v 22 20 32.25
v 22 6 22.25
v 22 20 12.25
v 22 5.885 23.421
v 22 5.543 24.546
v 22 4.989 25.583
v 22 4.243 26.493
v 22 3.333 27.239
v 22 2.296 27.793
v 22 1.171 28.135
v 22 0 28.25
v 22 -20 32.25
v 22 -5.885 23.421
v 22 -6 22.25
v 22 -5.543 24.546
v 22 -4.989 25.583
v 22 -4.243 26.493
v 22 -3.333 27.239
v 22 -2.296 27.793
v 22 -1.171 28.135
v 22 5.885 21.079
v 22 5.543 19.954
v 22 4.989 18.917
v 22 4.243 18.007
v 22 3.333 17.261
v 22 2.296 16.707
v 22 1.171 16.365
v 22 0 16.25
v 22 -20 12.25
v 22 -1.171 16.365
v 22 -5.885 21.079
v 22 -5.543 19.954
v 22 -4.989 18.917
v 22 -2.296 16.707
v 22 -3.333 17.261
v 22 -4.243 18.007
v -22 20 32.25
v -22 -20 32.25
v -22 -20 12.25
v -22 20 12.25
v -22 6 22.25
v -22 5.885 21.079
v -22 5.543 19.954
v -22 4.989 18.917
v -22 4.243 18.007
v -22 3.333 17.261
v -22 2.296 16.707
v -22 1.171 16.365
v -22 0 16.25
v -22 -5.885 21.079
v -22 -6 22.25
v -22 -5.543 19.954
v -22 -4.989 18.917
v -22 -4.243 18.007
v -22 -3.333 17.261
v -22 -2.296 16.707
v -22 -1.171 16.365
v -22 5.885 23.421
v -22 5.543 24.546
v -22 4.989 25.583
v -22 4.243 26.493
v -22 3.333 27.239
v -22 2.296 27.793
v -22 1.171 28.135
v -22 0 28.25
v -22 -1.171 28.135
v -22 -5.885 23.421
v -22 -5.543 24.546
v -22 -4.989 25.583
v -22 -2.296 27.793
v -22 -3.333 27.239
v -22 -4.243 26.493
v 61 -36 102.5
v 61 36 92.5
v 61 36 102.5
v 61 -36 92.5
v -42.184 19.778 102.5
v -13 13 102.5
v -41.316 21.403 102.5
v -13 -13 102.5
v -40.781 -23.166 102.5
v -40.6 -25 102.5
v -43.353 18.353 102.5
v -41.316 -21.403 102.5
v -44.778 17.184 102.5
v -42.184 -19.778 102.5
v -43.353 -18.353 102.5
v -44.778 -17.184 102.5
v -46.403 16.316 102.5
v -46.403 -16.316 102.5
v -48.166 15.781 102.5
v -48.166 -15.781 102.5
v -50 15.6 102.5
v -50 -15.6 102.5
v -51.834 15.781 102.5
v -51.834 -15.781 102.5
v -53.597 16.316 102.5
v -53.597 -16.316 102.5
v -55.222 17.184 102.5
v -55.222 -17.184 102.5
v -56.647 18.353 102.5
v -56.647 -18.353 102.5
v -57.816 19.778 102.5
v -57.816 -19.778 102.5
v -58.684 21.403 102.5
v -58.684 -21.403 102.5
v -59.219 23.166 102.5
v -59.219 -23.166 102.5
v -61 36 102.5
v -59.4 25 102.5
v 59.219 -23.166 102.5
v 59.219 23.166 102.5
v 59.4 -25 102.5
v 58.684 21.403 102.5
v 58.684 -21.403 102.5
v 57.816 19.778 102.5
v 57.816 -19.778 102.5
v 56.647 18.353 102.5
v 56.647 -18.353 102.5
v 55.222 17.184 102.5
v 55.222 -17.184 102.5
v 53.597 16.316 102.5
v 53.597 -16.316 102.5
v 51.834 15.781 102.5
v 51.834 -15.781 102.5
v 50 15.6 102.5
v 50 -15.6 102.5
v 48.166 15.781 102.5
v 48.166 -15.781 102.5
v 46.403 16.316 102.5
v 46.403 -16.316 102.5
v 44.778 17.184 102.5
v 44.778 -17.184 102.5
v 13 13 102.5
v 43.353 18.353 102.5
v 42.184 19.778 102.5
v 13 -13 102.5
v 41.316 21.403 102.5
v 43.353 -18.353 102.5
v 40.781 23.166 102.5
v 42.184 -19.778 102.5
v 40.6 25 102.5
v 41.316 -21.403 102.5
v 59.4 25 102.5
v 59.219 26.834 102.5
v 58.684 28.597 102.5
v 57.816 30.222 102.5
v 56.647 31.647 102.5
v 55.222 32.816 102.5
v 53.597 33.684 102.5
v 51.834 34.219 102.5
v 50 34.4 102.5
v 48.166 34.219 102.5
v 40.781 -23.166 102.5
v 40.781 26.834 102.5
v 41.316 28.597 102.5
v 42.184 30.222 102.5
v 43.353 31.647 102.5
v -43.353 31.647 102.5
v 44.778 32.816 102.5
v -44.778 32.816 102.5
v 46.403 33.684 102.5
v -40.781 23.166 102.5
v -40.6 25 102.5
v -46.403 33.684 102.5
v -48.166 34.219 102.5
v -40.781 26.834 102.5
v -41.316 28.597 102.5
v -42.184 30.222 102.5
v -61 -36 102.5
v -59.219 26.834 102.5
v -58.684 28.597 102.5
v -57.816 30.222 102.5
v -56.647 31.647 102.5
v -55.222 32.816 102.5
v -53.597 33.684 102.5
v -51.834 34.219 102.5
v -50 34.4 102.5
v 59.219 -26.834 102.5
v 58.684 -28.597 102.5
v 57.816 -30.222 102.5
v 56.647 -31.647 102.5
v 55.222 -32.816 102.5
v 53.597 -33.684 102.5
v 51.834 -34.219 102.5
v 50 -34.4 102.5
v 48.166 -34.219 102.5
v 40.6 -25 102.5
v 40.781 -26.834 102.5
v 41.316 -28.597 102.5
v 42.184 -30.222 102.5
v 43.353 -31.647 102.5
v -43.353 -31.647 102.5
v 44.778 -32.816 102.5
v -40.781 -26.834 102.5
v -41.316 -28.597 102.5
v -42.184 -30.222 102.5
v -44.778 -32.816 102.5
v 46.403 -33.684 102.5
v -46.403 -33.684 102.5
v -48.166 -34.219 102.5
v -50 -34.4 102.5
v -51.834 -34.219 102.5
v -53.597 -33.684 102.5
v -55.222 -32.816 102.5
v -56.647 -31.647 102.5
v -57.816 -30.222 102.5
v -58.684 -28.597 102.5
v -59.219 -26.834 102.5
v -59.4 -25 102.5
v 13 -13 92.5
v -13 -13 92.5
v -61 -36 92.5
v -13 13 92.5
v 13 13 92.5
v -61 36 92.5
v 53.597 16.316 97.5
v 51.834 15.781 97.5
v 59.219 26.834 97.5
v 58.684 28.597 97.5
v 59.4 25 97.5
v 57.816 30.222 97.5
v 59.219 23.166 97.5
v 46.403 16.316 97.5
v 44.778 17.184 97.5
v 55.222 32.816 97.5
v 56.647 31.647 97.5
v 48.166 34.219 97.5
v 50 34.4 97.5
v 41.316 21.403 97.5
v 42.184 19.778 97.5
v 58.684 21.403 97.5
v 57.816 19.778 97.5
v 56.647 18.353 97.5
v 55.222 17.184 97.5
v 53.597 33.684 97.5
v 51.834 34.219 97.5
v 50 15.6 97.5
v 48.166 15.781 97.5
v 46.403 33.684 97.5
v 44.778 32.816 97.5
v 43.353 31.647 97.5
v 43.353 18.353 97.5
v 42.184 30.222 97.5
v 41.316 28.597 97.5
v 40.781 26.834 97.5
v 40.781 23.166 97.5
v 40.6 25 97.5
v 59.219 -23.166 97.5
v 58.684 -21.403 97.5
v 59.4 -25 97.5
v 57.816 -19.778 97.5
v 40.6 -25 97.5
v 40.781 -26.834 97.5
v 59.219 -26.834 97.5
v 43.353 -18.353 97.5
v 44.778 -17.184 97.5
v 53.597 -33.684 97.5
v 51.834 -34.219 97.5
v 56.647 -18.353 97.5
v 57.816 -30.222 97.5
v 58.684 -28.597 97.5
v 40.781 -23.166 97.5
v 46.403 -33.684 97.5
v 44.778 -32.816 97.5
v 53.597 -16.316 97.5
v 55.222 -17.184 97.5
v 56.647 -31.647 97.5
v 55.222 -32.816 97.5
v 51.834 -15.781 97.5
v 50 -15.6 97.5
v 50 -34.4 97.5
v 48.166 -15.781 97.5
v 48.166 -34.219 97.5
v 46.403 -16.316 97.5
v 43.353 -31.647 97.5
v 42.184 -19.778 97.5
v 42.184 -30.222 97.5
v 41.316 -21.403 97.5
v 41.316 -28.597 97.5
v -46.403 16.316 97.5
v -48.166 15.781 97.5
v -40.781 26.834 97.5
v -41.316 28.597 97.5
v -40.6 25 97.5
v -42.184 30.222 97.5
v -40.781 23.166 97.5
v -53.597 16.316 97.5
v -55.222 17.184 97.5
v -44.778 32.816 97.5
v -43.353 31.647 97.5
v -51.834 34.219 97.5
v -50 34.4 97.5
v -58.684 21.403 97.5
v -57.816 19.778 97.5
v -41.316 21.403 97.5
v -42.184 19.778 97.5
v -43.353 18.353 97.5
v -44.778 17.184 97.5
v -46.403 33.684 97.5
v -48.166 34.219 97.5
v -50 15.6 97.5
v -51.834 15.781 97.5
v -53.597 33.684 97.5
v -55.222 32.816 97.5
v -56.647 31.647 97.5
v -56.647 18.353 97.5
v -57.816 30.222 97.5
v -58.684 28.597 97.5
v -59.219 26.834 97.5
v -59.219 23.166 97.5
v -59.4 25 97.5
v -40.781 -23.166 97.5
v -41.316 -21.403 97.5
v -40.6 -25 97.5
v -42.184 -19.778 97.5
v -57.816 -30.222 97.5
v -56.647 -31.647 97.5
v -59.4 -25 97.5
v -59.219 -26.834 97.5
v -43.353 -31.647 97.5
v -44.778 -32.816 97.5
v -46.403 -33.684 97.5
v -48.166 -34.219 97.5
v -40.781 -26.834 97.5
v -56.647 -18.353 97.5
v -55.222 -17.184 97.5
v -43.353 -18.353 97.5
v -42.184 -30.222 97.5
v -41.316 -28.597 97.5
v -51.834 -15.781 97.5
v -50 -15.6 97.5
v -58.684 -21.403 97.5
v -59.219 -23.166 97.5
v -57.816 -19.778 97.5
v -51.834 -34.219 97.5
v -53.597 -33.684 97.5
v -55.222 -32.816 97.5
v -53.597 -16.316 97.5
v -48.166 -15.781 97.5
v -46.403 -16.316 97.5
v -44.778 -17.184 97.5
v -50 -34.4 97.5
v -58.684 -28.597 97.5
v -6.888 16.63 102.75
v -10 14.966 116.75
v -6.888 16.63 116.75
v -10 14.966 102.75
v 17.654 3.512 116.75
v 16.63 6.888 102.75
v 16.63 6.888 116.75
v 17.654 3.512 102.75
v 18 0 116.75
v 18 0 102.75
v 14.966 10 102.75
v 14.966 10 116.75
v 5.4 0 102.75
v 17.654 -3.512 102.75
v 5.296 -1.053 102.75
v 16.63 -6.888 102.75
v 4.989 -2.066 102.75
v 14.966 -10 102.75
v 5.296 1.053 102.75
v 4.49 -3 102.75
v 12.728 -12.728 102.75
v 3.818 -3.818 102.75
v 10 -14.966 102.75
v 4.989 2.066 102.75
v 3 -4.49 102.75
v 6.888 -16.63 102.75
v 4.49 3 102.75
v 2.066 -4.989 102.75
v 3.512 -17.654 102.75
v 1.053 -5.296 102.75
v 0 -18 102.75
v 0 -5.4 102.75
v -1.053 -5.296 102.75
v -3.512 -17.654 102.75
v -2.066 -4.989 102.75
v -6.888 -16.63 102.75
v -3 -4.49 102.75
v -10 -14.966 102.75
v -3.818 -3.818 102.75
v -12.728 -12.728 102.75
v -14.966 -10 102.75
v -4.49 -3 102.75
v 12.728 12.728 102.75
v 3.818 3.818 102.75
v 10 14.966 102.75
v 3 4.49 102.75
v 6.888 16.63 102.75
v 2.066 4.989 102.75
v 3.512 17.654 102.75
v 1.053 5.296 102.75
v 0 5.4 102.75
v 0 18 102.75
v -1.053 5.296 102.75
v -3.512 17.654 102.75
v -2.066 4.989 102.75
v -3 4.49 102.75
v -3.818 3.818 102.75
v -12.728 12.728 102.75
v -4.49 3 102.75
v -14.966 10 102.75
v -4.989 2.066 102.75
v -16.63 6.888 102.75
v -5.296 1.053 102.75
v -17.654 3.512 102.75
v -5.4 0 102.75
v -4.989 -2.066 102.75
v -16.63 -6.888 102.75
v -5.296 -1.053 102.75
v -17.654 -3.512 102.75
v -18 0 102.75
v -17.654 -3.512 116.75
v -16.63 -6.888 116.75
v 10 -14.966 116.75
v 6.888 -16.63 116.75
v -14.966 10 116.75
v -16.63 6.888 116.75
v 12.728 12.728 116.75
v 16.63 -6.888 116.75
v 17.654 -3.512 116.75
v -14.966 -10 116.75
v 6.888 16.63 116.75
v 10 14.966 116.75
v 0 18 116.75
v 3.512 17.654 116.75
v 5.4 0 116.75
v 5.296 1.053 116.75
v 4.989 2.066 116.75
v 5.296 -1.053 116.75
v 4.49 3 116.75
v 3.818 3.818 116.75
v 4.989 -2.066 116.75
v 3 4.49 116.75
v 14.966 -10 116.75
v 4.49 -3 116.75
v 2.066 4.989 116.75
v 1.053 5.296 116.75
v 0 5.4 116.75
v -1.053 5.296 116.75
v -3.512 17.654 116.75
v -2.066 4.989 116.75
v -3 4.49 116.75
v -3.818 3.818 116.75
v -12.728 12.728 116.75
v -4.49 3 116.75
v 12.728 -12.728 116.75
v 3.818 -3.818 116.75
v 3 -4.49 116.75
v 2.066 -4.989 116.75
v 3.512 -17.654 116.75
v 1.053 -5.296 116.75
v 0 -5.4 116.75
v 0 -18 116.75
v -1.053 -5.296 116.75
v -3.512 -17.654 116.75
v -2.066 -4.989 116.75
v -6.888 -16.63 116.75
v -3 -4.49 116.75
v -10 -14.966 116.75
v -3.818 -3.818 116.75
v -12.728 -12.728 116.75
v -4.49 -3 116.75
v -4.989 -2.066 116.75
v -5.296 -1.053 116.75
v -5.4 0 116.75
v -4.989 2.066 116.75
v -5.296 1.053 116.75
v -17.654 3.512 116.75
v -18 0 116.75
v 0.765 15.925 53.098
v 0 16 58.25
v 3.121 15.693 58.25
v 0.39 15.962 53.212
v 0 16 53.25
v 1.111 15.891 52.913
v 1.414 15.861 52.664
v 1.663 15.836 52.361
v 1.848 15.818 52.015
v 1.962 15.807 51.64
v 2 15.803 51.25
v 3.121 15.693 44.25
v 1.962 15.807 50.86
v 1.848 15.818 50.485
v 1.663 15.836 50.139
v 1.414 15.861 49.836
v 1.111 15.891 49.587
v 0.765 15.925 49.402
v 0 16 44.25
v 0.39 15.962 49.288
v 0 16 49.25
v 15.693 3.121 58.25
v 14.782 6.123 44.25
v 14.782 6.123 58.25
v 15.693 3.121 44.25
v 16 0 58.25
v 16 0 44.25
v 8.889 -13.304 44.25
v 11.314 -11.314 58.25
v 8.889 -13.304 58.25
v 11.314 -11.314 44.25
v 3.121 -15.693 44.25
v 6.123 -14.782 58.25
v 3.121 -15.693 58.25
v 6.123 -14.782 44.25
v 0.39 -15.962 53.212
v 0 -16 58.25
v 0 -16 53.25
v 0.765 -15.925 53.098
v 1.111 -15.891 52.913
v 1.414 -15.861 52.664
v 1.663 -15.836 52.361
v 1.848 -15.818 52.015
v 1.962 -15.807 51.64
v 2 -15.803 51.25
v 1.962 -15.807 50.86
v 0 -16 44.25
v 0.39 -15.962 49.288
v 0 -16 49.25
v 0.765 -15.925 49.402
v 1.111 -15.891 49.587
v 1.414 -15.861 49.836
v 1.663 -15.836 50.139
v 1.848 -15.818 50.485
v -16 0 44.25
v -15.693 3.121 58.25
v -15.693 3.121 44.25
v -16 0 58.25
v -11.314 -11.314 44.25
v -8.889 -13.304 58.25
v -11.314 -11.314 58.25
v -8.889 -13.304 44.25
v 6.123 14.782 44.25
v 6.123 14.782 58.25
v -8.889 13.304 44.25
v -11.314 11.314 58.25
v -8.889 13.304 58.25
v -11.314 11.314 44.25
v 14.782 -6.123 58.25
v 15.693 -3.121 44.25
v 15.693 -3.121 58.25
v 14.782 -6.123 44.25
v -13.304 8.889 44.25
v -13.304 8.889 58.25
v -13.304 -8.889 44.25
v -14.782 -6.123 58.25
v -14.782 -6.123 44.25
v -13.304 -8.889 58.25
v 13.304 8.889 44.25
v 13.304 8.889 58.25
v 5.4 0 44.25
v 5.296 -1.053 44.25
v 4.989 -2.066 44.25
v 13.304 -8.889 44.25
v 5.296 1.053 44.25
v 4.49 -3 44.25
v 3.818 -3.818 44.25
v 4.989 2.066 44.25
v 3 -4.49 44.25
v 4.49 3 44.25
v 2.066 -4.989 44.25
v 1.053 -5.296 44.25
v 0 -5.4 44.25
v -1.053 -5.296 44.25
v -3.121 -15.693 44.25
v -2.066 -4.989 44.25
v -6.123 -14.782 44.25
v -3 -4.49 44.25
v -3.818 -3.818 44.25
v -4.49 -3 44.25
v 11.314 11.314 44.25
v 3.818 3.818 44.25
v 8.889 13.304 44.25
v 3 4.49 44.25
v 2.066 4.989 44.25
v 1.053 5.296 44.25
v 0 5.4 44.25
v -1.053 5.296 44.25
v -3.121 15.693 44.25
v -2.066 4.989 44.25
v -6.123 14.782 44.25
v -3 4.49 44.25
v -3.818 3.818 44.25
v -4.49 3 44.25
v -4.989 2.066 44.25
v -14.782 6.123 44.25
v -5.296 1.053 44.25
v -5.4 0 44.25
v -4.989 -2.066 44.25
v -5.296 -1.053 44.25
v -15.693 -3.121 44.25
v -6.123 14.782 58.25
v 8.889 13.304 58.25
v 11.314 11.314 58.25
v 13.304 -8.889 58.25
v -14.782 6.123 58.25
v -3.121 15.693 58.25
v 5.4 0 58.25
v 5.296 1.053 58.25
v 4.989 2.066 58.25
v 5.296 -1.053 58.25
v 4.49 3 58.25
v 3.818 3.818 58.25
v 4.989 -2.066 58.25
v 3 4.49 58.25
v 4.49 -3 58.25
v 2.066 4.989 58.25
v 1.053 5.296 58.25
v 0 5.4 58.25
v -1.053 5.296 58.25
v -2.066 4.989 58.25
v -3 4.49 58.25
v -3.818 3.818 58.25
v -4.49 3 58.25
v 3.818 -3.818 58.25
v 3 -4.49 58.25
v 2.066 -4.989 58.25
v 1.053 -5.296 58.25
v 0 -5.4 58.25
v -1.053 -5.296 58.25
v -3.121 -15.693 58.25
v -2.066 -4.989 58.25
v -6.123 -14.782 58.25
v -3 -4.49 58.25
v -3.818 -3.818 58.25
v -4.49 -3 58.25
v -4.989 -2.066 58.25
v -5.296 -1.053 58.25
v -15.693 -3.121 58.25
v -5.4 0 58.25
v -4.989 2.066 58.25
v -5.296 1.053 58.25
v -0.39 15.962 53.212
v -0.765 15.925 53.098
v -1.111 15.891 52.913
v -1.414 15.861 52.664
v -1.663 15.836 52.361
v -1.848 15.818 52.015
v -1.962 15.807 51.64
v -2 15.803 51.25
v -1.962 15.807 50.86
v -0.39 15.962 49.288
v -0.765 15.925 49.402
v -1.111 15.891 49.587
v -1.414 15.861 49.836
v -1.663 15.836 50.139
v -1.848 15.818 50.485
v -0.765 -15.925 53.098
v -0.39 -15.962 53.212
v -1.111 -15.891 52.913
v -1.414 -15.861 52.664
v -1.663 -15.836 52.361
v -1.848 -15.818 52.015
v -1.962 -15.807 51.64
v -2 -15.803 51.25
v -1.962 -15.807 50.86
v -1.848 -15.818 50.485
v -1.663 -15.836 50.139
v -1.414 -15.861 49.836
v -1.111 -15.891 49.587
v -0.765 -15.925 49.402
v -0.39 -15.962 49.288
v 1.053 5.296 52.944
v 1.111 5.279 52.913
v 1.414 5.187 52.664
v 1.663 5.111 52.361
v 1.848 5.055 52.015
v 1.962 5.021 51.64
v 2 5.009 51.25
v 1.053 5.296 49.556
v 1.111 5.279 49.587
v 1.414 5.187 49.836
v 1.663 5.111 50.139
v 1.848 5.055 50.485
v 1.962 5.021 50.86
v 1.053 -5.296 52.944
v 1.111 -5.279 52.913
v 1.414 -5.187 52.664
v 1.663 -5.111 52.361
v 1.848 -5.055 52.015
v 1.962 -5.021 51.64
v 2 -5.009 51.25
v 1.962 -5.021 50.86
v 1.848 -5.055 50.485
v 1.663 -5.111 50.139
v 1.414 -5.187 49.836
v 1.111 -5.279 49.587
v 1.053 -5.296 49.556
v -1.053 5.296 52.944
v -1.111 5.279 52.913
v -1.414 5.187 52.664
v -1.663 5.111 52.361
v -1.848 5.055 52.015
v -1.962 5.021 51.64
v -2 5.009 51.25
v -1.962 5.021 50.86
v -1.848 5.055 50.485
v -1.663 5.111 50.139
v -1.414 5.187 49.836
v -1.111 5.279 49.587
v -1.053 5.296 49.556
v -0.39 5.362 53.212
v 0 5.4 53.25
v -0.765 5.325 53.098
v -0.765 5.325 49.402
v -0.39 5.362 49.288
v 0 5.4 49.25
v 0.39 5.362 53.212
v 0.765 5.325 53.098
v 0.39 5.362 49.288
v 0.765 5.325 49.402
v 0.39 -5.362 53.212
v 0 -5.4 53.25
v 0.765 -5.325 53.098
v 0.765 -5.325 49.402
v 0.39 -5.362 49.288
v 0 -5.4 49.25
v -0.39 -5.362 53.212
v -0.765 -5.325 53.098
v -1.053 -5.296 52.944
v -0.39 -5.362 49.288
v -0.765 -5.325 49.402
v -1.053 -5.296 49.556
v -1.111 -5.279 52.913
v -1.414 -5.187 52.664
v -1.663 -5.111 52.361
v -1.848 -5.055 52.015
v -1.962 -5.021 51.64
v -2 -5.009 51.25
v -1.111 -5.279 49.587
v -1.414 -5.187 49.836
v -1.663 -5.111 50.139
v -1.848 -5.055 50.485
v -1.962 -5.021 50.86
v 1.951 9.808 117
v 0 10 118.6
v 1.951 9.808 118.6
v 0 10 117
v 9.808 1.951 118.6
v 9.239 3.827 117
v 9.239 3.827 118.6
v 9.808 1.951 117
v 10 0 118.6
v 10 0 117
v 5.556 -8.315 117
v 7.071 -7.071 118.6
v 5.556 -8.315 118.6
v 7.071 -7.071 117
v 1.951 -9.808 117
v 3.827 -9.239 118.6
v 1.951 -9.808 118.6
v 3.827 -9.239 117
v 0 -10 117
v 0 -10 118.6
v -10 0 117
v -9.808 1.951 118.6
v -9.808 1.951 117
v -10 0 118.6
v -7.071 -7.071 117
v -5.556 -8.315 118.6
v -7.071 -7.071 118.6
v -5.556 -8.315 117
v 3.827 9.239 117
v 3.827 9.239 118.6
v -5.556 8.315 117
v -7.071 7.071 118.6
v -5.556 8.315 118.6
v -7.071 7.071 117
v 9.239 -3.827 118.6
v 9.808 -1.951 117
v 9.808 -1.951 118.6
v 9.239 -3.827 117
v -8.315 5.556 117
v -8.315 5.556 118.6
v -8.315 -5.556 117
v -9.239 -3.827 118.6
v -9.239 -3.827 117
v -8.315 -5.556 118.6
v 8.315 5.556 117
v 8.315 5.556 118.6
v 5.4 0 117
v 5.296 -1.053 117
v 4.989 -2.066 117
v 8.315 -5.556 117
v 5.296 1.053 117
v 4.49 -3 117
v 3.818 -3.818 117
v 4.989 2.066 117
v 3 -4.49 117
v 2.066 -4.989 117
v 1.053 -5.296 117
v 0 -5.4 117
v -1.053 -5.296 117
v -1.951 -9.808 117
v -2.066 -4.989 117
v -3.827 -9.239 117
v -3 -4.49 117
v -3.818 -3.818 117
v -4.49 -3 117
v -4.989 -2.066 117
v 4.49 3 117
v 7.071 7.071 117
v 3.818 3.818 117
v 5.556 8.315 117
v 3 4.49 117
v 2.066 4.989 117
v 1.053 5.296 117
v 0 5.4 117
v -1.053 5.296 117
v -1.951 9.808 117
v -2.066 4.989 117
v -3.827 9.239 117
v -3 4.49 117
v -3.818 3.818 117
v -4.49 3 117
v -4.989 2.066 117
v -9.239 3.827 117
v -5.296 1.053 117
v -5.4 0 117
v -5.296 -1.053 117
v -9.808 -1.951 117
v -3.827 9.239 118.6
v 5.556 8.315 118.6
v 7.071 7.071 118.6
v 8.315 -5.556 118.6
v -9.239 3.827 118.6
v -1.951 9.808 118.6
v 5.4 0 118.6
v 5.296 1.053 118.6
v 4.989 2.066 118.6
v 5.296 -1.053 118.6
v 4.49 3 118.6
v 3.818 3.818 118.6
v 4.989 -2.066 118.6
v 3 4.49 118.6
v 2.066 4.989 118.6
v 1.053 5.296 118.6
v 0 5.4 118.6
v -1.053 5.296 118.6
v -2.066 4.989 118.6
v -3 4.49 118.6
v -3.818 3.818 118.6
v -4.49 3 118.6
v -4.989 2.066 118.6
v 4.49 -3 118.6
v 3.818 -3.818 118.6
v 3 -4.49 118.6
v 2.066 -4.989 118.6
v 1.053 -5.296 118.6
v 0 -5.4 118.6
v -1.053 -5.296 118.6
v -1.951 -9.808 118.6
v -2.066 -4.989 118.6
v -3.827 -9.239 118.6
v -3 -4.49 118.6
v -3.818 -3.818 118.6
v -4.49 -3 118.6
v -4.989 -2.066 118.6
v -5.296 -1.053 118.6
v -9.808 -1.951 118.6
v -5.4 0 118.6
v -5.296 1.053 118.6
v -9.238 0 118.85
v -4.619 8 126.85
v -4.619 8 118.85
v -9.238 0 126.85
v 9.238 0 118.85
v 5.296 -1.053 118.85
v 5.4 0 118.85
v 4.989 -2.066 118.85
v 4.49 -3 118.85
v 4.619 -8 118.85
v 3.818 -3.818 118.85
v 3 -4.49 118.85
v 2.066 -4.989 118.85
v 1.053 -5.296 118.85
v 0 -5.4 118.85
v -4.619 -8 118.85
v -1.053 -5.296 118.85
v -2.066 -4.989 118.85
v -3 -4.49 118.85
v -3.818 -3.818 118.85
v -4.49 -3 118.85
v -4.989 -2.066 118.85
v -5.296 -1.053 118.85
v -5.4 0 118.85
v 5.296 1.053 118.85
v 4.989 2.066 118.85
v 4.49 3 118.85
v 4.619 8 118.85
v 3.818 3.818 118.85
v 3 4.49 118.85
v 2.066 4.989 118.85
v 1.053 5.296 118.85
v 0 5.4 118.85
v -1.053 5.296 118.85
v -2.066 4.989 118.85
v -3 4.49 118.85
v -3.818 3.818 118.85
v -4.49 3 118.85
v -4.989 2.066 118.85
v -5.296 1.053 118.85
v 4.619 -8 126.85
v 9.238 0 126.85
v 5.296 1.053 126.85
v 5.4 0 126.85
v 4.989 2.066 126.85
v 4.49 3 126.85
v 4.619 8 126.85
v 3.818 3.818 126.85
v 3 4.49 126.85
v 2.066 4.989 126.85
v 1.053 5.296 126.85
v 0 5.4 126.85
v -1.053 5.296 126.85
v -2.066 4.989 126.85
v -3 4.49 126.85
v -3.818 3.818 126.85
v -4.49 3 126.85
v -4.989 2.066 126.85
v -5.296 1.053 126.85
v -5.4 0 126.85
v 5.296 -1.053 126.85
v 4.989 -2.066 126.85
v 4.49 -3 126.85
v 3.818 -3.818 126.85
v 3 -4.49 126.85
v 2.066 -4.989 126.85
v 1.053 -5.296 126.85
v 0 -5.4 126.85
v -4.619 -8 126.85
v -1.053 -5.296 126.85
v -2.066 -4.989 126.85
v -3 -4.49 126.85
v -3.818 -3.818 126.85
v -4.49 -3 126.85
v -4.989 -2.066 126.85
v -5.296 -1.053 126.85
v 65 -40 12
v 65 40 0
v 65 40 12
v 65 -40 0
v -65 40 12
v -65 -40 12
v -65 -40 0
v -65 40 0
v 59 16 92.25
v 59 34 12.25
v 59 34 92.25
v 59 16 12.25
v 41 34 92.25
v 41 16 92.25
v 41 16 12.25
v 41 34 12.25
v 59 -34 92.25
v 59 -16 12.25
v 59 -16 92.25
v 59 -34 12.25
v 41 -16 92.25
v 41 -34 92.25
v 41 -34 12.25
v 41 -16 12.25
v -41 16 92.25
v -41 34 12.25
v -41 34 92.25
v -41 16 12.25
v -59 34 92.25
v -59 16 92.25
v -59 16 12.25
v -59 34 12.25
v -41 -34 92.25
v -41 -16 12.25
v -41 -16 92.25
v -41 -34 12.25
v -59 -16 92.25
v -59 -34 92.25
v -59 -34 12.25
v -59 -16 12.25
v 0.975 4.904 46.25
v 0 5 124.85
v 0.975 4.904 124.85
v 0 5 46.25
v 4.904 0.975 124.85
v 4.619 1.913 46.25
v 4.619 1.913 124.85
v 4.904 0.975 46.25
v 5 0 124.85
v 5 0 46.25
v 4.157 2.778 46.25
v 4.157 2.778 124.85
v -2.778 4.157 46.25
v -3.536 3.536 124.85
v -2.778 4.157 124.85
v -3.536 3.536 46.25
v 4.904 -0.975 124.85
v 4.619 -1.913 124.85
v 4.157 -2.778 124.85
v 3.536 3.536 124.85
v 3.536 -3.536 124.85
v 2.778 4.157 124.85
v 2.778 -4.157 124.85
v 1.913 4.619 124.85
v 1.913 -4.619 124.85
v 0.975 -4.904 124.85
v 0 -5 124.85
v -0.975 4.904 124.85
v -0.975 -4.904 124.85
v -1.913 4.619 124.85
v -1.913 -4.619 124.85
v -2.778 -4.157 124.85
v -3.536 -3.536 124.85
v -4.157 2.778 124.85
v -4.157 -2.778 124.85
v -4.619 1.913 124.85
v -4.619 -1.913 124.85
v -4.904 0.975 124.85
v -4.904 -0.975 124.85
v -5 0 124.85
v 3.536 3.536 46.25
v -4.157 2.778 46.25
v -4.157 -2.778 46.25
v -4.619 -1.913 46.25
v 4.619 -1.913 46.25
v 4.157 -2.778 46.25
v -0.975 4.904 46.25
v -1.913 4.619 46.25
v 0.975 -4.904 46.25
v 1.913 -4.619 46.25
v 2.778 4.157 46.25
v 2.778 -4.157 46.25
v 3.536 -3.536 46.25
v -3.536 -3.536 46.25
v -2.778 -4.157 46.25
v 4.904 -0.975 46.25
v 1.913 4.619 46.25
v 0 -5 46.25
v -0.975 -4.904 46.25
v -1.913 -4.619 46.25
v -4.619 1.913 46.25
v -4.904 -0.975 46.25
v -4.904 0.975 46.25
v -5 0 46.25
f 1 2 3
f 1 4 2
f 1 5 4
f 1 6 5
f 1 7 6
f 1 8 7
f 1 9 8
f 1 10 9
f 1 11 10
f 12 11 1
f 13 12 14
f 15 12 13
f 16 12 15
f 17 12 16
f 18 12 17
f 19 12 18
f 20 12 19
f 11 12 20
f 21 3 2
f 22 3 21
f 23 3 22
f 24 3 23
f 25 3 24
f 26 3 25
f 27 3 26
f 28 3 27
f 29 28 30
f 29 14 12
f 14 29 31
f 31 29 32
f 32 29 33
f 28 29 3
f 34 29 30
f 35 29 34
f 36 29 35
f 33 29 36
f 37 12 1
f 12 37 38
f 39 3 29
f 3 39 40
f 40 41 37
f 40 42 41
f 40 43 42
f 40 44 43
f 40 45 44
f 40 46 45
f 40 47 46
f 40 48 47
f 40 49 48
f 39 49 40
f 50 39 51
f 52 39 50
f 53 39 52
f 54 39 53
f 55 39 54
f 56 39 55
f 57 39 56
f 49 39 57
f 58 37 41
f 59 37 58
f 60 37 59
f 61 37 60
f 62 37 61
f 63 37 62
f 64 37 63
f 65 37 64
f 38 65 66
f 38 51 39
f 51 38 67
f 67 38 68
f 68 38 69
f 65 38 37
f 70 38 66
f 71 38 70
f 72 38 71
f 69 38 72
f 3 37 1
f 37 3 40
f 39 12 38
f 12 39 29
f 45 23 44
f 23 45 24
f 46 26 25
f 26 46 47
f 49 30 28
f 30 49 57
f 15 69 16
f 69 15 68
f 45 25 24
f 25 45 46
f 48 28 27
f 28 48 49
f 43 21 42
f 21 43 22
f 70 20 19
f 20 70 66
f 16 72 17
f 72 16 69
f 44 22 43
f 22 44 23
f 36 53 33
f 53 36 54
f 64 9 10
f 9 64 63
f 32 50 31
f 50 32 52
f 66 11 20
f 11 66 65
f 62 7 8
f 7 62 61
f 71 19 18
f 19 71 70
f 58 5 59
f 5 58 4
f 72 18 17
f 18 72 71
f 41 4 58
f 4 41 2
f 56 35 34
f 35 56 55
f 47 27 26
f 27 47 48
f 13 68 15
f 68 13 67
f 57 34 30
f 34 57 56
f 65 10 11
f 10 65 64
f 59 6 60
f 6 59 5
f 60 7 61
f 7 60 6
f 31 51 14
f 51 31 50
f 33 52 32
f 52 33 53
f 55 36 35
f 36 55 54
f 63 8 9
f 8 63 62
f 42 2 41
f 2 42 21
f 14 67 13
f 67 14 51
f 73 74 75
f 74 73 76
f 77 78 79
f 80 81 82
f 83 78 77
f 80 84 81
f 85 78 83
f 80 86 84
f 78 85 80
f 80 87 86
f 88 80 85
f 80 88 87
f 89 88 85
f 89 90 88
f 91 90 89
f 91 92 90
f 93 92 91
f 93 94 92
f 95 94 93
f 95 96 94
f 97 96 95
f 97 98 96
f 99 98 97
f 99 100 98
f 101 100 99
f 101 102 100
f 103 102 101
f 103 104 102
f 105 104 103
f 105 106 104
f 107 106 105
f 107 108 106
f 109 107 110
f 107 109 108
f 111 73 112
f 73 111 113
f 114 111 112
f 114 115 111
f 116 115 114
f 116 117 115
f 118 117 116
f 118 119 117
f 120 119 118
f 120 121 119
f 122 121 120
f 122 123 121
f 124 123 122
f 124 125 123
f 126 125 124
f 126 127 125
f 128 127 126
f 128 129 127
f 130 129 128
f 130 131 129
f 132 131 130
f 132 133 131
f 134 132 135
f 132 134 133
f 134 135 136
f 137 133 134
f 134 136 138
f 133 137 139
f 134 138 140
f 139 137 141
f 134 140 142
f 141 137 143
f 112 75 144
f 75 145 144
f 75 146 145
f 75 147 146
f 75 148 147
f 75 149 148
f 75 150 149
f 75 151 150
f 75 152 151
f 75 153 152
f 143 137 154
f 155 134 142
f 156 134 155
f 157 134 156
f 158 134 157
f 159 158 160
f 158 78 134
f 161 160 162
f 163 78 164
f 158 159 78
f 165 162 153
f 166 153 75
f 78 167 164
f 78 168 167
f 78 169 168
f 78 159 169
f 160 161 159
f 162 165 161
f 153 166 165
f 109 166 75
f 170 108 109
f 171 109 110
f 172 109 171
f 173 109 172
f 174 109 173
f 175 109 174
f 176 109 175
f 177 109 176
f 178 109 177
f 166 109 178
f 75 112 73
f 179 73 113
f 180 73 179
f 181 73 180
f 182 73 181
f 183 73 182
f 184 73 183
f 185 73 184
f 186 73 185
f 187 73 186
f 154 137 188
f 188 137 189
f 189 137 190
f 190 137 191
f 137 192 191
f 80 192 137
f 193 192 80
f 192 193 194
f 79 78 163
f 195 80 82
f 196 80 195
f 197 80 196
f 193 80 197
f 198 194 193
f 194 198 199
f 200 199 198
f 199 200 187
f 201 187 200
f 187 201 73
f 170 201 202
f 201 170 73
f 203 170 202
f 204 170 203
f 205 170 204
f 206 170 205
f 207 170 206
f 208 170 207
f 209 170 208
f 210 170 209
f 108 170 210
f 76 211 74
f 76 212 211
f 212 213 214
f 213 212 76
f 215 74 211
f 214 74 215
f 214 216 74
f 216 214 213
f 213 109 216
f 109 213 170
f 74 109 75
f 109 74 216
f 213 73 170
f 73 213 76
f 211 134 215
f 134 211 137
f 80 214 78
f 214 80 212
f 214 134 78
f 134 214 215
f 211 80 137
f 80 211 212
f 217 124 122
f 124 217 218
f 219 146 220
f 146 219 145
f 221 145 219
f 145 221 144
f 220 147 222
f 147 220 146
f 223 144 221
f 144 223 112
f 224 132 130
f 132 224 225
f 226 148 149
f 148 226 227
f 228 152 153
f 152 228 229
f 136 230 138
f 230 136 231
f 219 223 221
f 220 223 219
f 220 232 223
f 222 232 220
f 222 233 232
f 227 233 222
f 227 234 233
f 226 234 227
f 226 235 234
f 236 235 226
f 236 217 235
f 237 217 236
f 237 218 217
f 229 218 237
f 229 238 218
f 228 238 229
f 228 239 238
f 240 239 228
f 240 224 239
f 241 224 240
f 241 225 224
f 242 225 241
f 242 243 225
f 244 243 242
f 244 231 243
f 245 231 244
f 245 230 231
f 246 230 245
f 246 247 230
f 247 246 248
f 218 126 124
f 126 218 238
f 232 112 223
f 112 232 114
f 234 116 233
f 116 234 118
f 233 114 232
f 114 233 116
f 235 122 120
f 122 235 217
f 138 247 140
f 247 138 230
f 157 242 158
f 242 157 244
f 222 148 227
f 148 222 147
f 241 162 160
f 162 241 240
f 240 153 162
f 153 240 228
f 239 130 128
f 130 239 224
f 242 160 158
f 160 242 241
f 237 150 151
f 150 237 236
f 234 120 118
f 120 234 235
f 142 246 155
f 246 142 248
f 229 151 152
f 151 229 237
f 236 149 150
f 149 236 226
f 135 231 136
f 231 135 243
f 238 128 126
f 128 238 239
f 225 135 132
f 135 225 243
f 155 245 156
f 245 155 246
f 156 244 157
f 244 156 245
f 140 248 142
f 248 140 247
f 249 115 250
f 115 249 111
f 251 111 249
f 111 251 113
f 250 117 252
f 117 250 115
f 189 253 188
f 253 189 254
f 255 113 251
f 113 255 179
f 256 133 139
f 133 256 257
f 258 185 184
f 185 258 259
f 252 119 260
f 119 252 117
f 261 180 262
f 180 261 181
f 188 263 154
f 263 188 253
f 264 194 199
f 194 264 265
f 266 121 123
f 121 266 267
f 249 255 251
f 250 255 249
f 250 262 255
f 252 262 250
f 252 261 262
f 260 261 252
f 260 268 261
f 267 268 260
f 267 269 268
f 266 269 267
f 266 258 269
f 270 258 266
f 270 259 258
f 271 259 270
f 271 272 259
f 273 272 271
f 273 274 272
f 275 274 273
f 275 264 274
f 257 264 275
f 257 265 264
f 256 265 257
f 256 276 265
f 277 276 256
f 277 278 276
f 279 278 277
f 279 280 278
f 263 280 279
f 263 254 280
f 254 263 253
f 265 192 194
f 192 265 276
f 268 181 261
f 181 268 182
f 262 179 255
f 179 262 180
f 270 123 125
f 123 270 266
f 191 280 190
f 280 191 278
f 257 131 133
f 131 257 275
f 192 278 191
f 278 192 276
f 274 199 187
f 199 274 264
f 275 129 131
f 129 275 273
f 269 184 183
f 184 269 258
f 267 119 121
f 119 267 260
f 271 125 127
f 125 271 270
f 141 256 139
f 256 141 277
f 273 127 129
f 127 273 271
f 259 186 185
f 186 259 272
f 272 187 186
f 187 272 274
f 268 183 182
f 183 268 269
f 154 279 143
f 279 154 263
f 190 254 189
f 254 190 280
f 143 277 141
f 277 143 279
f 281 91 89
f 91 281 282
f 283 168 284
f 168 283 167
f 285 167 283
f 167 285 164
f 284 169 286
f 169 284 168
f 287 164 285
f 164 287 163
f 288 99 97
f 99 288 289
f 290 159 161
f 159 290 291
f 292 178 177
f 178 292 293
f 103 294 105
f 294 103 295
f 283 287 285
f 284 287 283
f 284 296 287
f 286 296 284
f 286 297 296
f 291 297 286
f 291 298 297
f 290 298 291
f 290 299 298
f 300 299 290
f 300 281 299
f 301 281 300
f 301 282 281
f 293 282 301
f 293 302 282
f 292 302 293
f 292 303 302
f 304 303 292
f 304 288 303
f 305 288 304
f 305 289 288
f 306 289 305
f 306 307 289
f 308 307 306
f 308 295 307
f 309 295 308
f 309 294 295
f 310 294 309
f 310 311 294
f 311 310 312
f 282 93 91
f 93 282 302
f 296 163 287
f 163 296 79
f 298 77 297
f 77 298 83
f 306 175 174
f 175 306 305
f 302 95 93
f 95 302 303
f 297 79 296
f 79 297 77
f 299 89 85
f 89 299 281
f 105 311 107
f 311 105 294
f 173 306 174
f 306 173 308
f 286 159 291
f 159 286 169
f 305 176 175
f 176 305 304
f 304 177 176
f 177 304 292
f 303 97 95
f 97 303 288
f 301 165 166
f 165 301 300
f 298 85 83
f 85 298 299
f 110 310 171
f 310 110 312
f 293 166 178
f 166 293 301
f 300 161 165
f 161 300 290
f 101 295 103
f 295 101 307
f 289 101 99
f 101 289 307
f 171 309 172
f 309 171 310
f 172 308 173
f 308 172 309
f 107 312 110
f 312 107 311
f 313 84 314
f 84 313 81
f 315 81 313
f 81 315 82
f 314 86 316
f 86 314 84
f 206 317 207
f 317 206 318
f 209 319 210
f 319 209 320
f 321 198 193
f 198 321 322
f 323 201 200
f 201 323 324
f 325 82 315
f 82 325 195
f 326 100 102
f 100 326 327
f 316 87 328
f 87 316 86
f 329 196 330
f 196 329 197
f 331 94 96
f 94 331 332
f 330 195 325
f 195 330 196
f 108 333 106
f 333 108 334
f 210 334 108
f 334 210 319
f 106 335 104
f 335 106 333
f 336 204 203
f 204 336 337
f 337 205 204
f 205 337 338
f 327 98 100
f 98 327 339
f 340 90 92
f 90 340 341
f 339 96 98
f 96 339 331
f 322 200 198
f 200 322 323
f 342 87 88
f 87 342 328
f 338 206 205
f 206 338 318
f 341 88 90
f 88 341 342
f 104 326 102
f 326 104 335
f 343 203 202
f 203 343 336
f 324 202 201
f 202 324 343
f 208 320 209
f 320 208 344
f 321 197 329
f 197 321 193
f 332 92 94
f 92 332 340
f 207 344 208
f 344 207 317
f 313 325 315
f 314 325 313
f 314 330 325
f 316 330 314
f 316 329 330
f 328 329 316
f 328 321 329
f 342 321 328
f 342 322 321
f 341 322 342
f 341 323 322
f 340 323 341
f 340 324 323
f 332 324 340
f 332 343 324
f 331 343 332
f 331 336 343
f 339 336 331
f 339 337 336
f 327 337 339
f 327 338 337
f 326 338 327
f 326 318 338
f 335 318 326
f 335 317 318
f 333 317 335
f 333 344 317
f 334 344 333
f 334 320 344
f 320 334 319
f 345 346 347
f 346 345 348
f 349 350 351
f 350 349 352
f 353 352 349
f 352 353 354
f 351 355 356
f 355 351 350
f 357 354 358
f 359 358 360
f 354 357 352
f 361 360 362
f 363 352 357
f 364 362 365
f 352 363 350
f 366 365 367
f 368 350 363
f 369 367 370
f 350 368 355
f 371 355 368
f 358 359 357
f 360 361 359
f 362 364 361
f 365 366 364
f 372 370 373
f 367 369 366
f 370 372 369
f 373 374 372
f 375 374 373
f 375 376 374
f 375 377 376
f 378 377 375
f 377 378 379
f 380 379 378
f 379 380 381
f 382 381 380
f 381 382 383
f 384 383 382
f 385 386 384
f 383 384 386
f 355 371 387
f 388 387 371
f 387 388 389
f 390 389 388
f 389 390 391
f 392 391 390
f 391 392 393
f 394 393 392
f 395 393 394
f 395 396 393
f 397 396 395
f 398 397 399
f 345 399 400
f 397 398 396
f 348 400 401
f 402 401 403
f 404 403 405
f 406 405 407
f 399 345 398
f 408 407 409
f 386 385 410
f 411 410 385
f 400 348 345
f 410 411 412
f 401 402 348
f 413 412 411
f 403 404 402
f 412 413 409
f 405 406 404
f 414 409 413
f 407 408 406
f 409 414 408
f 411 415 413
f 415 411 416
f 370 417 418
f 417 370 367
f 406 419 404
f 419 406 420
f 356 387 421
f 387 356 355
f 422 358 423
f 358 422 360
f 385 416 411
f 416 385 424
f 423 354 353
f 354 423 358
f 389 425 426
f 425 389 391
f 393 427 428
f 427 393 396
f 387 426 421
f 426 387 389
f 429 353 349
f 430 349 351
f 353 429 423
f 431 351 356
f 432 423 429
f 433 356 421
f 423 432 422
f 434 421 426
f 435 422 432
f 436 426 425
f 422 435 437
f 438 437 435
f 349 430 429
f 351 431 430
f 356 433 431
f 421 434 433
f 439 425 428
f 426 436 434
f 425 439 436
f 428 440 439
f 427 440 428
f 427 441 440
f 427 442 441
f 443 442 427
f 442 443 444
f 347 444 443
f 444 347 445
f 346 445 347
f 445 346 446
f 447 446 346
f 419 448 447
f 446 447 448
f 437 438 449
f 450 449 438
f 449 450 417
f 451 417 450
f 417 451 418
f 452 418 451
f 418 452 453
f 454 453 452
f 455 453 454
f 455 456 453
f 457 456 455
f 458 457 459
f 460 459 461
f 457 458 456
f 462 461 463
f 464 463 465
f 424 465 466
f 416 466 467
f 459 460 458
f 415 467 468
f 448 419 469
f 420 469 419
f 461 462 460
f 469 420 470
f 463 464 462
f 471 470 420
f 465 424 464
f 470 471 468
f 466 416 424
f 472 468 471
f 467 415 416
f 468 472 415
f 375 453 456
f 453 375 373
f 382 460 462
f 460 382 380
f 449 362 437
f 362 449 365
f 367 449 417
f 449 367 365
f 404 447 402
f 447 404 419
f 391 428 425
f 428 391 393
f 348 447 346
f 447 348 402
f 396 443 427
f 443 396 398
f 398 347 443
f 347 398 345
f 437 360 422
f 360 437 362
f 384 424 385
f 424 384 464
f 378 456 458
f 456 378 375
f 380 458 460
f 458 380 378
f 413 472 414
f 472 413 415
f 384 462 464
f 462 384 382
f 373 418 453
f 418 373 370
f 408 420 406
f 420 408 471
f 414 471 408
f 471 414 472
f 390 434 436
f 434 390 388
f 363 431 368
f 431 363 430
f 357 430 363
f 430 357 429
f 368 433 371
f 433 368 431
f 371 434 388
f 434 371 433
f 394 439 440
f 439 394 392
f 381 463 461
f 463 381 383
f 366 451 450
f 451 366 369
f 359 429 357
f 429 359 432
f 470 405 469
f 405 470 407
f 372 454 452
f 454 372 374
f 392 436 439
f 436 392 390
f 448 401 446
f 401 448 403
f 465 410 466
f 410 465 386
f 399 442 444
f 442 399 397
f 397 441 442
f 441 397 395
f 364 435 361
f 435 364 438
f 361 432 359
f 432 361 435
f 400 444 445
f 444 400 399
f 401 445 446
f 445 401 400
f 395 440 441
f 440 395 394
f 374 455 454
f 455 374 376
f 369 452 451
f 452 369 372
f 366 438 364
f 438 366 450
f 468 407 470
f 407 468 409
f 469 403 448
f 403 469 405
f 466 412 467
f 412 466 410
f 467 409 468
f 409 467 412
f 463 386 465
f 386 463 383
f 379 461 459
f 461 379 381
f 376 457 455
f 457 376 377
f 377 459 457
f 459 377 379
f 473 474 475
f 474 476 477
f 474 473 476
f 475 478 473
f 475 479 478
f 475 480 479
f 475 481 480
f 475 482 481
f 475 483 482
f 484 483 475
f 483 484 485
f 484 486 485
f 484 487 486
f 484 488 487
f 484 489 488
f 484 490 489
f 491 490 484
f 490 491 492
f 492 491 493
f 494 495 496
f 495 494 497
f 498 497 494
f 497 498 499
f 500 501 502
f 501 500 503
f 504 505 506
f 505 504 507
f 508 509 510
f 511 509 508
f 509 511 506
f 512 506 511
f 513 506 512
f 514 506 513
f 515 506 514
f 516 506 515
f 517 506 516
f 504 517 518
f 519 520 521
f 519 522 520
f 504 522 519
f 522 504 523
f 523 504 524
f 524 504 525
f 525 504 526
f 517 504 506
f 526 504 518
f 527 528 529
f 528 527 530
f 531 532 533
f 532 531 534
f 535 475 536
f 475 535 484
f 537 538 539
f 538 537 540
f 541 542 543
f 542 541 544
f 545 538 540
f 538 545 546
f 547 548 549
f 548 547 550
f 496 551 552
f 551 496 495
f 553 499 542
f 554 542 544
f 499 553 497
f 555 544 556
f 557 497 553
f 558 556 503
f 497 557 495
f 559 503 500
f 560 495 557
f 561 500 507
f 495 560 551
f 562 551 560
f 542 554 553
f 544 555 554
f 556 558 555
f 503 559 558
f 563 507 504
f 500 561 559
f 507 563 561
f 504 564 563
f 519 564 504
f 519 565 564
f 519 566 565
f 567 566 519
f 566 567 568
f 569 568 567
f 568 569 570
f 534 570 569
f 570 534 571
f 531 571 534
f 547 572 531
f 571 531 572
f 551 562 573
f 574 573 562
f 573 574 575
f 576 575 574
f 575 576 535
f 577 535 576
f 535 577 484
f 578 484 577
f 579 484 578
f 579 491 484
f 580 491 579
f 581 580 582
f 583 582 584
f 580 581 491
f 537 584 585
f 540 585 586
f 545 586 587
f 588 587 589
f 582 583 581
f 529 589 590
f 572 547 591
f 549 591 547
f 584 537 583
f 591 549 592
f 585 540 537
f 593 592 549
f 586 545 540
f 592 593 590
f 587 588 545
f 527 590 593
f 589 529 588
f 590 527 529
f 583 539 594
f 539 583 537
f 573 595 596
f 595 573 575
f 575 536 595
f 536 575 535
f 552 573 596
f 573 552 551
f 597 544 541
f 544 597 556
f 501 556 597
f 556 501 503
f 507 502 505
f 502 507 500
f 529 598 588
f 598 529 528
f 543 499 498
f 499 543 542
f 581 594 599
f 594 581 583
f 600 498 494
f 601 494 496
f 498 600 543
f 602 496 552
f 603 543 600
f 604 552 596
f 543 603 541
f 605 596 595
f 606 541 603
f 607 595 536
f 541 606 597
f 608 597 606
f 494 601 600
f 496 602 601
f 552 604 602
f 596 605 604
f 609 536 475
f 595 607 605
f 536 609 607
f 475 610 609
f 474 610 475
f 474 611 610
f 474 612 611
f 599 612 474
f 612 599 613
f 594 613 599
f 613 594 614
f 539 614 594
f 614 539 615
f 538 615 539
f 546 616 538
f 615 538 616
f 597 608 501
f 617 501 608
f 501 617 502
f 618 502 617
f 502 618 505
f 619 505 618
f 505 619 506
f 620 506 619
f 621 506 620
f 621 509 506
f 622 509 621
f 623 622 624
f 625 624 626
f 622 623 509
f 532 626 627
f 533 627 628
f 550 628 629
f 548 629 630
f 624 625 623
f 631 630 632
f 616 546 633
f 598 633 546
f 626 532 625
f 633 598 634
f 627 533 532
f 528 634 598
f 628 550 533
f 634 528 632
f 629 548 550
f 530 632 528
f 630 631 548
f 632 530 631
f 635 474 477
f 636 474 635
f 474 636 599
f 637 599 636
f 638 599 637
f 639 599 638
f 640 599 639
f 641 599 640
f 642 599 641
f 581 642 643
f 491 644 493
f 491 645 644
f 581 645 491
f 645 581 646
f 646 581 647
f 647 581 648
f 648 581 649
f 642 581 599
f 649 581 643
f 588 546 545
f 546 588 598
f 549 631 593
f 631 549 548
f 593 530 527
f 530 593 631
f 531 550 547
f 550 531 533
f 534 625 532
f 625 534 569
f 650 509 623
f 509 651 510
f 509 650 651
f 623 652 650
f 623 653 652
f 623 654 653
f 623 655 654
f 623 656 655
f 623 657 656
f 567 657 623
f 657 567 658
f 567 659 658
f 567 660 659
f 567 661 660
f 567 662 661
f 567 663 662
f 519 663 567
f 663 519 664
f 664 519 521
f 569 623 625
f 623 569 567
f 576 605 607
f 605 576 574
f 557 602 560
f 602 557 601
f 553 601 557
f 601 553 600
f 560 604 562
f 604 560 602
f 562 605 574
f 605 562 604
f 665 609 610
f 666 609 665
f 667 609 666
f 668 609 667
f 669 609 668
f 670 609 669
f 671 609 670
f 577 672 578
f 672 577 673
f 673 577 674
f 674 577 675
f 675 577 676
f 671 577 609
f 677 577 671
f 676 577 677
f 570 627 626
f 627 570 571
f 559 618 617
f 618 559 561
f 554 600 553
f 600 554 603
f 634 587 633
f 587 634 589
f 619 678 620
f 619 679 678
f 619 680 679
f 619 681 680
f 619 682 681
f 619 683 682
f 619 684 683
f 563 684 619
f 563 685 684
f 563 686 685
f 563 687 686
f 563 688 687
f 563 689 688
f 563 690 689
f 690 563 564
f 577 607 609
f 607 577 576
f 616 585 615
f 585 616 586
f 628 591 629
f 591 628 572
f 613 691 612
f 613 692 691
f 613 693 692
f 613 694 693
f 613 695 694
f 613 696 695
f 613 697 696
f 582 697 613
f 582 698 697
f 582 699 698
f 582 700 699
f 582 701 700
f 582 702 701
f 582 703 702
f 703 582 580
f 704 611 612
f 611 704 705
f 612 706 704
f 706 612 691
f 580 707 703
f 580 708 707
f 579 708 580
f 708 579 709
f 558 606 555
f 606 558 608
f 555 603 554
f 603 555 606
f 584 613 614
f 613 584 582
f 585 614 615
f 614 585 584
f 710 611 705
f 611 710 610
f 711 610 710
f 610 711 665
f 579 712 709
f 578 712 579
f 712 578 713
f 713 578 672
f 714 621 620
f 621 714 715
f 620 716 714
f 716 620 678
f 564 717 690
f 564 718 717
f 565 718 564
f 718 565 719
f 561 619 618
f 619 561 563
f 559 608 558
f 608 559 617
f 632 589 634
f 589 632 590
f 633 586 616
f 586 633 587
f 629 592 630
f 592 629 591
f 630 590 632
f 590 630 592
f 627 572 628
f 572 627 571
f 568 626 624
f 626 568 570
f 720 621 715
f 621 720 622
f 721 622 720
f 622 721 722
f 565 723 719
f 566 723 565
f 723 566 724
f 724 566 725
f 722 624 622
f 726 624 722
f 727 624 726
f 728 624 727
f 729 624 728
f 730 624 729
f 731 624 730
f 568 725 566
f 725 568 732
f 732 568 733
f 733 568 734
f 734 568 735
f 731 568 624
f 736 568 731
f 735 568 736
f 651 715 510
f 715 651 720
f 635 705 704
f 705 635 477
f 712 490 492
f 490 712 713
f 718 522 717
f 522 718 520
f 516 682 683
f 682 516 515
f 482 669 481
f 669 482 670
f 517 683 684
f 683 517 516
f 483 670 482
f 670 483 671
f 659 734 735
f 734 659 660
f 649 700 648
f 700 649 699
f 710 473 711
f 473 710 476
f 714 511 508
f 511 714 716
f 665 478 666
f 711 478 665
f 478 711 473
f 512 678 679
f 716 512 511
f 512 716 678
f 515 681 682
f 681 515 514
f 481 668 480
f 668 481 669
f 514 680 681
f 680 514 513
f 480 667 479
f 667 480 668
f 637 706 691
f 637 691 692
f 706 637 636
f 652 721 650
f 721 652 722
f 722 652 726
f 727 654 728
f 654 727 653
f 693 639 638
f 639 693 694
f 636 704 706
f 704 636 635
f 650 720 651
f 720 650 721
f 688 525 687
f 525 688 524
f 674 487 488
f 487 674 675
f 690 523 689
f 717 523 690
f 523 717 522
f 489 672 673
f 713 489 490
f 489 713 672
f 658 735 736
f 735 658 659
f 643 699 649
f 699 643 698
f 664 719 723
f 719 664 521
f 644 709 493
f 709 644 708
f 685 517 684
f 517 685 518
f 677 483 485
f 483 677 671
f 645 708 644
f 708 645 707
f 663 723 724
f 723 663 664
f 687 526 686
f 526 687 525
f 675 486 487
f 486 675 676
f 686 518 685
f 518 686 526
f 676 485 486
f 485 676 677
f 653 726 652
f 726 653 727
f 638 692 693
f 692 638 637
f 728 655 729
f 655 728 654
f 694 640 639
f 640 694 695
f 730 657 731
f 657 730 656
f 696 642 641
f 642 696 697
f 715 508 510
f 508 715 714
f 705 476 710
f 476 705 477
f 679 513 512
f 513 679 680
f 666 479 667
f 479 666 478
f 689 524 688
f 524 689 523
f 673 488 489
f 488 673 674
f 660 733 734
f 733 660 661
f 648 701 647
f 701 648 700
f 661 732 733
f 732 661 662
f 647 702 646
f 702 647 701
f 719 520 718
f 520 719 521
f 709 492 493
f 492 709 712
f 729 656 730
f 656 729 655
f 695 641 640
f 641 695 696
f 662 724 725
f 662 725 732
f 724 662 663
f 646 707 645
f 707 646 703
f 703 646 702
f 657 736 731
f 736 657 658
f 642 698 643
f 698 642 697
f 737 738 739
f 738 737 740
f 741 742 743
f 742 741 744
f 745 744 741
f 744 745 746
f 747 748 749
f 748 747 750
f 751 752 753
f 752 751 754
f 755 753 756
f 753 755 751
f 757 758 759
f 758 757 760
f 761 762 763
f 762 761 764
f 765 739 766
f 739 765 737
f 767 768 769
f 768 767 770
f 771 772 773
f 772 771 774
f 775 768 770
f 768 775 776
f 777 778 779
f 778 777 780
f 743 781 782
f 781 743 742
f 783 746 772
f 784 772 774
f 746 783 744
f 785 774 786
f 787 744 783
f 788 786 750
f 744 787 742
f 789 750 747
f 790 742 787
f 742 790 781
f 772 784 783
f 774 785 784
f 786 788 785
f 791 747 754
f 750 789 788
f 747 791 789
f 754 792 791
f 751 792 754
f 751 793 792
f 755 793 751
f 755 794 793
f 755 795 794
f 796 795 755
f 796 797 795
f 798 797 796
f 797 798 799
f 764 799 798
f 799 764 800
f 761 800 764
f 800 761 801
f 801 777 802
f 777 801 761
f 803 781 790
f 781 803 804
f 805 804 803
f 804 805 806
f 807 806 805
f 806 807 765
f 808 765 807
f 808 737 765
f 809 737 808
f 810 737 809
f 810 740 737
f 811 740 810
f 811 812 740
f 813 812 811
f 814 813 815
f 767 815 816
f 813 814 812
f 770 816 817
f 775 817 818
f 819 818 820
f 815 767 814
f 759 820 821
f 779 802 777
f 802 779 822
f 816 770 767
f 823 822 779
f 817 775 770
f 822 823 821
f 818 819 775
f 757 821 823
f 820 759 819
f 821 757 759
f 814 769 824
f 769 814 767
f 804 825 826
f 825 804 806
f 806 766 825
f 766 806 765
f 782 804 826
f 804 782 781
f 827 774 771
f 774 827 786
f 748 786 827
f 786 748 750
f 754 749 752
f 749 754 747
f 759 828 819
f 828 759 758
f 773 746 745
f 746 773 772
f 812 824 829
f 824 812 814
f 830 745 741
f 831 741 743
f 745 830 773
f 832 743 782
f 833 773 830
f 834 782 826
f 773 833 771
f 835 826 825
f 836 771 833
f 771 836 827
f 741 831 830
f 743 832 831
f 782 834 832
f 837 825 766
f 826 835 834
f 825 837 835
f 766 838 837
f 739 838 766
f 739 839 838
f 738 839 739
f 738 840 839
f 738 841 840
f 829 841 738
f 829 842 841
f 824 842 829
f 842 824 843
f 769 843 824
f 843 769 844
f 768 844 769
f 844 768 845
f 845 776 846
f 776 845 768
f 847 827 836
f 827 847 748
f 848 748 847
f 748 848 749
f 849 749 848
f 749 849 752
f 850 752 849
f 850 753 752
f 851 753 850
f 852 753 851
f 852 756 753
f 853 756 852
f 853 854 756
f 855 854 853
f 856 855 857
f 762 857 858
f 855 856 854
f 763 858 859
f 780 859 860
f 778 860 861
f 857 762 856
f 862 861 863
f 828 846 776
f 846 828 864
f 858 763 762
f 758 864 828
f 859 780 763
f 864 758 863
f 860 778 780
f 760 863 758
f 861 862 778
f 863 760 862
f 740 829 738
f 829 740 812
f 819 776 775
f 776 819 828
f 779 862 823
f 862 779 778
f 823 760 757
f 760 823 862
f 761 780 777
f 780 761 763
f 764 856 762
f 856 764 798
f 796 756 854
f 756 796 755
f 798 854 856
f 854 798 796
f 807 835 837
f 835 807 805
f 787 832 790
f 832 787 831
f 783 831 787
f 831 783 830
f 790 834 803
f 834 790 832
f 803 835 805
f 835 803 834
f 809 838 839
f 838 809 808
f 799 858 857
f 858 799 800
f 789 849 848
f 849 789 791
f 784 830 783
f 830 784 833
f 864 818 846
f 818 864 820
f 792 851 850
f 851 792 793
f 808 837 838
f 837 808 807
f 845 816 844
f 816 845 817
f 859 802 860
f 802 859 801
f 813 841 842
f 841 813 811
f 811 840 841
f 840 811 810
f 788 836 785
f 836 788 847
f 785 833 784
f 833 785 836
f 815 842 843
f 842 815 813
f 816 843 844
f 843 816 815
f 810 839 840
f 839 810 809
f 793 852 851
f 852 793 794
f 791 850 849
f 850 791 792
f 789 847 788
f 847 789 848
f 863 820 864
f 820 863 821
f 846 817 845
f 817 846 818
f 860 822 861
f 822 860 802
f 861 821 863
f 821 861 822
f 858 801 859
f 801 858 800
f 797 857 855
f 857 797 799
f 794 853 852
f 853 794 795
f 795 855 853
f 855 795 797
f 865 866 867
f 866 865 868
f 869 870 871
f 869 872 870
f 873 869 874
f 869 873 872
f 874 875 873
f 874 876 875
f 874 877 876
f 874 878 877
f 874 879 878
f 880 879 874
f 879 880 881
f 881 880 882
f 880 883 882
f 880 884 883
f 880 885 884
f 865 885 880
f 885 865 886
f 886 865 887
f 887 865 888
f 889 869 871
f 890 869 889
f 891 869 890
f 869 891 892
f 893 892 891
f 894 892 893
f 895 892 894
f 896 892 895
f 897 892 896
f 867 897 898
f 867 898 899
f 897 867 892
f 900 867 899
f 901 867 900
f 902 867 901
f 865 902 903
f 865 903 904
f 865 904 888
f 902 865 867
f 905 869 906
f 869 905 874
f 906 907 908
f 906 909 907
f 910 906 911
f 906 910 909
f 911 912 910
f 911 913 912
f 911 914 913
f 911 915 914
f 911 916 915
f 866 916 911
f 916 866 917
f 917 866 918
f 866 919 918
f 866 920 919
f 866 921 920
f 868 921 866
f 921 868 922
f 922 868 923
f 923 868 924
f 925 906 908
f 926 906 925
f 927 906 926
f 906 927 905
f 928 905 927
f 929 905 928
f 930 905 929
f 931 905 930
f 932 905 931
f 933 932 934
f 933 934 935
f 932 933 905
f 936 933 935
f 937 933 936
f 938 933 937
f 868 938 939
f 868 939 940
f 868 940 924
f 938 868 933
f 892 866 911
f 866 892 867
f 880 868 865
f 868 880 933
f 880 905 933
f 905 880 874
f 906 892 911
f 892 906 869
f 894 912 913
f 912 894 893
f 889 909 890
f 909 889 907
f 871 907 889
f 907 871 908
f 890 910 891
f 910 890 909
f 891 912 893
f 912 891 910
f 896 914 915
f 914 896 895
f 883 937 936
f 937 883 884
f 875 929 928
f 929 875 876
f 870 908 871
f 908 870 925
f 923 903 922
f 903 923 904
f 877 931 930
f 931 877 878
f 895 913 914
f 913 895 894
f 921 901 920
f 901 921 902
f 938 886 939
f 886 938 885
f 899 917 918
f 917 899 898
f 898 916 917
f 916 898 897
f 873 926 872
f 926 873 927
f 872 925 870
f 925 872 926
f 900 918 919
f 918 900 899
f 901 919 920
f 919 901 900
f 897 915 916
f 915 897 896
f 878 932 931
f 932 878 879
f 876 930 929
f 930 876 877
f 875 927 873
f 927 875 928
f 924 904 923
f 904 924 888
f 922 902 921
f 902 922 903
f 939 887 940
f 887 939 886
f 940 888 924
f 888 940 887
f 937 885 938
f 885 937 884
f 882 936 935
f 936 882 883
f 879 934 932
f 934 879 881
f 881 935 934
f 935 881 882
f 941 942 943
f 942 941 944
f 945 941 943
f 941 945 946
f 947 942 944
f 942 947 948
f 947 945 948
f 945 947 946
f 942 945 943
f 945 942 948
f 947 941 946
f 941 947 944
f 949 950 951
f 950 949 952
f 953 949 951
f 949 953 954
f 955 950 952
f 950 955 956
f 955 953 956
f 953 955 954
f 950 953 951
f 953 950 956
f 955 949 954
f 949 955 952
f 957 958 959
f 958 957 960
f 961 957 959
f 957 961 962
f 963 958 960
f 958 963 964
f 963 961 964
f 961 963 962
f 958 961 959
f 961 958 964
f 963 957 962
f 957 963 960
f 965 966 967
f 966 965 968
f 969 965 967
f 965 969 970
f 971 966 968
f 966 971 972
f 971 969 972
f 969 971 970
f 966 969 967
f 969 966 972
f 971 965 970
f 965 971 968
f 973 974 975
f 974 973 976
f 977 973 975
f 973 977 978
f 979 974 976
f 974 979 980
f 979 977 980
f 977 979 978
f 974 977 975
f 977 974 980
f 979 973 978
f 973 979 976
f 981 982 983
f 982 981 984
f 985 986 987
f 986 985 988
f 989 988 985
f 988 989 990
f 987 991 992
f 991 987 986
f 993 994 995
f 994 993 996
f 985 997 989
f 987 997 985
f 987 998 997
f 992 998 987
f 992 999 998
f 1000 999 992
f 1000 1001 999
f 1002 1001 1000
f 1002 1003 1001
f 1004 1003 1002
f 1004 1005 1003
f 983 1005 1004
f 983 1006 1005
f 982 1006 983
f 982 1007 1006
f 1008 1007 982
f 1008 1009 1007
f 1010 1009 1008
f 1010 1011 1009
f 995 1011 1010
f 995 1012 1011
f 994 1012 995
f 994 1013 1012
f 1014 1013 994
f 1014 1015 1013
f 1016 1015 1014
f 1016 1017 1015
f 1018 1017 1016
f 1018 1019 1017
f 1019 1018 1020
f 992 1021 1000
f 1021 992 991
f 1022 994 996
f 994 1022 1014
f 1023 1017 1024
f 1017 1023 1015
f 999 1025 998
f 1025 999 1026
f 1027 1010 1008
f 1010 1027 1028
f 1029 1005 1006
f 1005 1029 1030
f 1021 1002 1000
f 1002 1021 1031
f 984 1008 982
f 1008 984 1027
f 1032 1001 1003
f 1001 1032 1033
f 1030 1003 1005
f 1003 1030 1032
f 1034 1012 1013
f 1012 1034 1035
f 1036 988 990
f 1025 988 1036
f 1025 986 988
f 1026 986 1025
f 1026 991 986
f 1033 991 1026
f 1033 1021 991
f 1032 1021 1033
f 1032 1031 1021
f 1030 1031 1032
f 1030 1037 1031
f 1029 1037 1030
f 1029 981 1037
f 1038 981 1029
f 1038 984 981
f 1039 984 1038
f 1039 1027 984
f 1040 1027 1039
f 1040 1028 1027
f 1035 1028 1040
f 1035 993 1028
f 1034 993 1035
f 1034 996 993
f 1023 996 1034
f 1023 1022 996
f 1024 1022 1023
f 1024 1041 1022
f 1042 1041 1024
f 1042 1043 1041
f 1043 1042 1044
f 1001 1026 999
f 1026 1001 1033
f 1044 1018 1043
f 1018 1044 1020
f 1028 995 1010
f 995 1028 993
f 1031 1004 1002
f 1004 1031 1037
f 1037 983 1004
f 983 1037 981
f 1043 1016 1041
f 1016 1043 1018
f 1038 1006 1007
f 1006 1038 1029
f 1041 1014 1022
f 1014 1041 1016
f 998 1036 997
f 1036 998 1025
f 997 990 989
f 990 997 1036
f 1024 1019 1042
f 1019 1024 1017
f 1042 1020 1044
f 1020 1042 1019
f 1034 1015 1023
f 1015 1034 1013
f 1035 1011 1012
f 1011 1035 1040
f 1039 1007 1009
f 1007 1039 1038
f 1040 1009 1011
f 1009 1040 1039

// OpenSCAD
$fn = 32;

// ------------------------------------------------------------------------
// Arbor press fixture: screw d10, posts 80 mm, gap 12 mm
// Every part is its own module, assembly() places every instance.
// ------------------------------------------------------------------------

// --- part 1 ---
module press_bed() {
  difference() {
    translate([-65, -40, 0]) cube([130, 80, 12]);
  }
}

// --- part 2 ---
module anvil_block() {
  difference() {
    translate([-22, -20, 0]) cube([44, 40, 20]);
    translate([0, 0, 10]) rotate([0, 90, 0]) cylinder(h = 46, d = 12, center = true);
  }
}

// --- part 3 ---
module press_post_a() {
  translate([-9, -9, 0]) cube([18, 18, 80]);
}

// --- part 4 ---
module press_post_b() {
  translate([-9, -9, 0]) cube([18, 18, 80]);
}

// --- part 5 ---
module press_post_c() {
  translate([-9, -9, 0]) cube([18, 18, 80]);
}

// --- part 6 ---
module press_post_d() {
  translate([-9, -9, 0]) cube([18, 18, 80]);
}

// --- part 7 ---
module press_frame() {
  difference() {
    translate([-61, -36, 0]) cube([122, 72, 10]);
    translate([-13, -13, -1]) cube([26, 26, 12]);
    translate([50, 25, 5]) cylinder(h = 6, d = 18.8);
    translate([50, -25, 5]) cylinder(h = 6, d = 18.8);
    translate([-50, 25, 5]) cylinder(h = 6, d = 18.8);
    translate([-50, -25, 5]) cylinder(h = 6, d = 18.8);
  }
}

// --- part 8 ---
module guide_ring() {
  difference() {
      translate([0, 0, 0]) cylinder(h = 14, d = 36);
      translate([0, 0, -1]) cylinder(h = 16, d = 10.8);
    }
}

// --- part 9 ---
module press_screw() {
  translate([0, 0, -39.3]) cylinder(h = 78.6, d = 10);
}

// --- part 10 ---
module press_head() {
  difference() {
    cylinder(h = 14, d = 32);
    translate([0, 0, -1]) cylinder(h = 16, d = 10.8);
    translate([0, 0, 7]) rotate([90, 0, 0]) cylinder(h = 34, d = 4, center = true);
  }
}

// --- part 11 ---
module nut_washer() {
  difference() {
      translate([0, 0, 0]) cylinder(h = 1.6, d = 20);
      translate([0, 0, -1]) cylinder(h = 3.6, d = 10.8);
    }
}

// --- part 12 ---
module press_nut() {
  difference() {
    linear_extrude(height = 8) polygon(points = [[9.238, 0], [4.619, 8], [-4.619, 8], [-9.238, 0], [-4.619, -8], [4.619, -8]]);
    translate([0, 0, -1]) cylinder(h = 10, d = 10.8);
  }
}

// --- assembly ---
module assembly() {
  color([0.80, 0.24, 0.20]) translate([0, 0, 0]) rotate([0, 0, 0]) press_bed();
  color([0.20, 0.45, 0.75]) translate([0, 0, 12.25]) rotate([0, 0, 0]) anvil_block();
  color([0.25, 0.62, 0.32]) translate([50, 25, 12.25]) rotate([0, 0, 0]) press_post_a();
  color([0.92, 0.70, 0.18]) translate([50, -25, 12.25]) rotate([0, 0, 0]) press_post_b();
  color([0.58, 0.35, 0.70]) translate([-50, 25, 12.25]) rotate([0, 0, 0]) press_post_c();
  color([0.16, 0.66, 0.66]) translate([-50, -25, 12.25]) rotate([0, 0, 0]) press_post_d();
  color([0.85, 0.48, 0.18]) translate([0, 0, 92.5]) rotate([0, 0, 0]) press_frame();
  color([0.55, 0.60, 0.65]) translate([0, 0, 102.75]) rotate([0, 0, 0]) guide_ring();
  color([0.75, 0.30, 0.55]) translate([0, 0, 85.55]) rotate([0, 0, 0]) press_screw();
  color([0.42, 0.52, 0.28]) translate([0, 0, 44.25]) rotate([0, 0, 0]) press_head();
  color([0.80, 0.24, 0.20]) translate([0, 0, 117]) rotate([0, 0, 0]) nut_washer();
  color([0.20, 0.45, 0.75]) translate([0, 0, 118.85]) rotate([0, 0, 0]) press_nut();
}

assembly();
